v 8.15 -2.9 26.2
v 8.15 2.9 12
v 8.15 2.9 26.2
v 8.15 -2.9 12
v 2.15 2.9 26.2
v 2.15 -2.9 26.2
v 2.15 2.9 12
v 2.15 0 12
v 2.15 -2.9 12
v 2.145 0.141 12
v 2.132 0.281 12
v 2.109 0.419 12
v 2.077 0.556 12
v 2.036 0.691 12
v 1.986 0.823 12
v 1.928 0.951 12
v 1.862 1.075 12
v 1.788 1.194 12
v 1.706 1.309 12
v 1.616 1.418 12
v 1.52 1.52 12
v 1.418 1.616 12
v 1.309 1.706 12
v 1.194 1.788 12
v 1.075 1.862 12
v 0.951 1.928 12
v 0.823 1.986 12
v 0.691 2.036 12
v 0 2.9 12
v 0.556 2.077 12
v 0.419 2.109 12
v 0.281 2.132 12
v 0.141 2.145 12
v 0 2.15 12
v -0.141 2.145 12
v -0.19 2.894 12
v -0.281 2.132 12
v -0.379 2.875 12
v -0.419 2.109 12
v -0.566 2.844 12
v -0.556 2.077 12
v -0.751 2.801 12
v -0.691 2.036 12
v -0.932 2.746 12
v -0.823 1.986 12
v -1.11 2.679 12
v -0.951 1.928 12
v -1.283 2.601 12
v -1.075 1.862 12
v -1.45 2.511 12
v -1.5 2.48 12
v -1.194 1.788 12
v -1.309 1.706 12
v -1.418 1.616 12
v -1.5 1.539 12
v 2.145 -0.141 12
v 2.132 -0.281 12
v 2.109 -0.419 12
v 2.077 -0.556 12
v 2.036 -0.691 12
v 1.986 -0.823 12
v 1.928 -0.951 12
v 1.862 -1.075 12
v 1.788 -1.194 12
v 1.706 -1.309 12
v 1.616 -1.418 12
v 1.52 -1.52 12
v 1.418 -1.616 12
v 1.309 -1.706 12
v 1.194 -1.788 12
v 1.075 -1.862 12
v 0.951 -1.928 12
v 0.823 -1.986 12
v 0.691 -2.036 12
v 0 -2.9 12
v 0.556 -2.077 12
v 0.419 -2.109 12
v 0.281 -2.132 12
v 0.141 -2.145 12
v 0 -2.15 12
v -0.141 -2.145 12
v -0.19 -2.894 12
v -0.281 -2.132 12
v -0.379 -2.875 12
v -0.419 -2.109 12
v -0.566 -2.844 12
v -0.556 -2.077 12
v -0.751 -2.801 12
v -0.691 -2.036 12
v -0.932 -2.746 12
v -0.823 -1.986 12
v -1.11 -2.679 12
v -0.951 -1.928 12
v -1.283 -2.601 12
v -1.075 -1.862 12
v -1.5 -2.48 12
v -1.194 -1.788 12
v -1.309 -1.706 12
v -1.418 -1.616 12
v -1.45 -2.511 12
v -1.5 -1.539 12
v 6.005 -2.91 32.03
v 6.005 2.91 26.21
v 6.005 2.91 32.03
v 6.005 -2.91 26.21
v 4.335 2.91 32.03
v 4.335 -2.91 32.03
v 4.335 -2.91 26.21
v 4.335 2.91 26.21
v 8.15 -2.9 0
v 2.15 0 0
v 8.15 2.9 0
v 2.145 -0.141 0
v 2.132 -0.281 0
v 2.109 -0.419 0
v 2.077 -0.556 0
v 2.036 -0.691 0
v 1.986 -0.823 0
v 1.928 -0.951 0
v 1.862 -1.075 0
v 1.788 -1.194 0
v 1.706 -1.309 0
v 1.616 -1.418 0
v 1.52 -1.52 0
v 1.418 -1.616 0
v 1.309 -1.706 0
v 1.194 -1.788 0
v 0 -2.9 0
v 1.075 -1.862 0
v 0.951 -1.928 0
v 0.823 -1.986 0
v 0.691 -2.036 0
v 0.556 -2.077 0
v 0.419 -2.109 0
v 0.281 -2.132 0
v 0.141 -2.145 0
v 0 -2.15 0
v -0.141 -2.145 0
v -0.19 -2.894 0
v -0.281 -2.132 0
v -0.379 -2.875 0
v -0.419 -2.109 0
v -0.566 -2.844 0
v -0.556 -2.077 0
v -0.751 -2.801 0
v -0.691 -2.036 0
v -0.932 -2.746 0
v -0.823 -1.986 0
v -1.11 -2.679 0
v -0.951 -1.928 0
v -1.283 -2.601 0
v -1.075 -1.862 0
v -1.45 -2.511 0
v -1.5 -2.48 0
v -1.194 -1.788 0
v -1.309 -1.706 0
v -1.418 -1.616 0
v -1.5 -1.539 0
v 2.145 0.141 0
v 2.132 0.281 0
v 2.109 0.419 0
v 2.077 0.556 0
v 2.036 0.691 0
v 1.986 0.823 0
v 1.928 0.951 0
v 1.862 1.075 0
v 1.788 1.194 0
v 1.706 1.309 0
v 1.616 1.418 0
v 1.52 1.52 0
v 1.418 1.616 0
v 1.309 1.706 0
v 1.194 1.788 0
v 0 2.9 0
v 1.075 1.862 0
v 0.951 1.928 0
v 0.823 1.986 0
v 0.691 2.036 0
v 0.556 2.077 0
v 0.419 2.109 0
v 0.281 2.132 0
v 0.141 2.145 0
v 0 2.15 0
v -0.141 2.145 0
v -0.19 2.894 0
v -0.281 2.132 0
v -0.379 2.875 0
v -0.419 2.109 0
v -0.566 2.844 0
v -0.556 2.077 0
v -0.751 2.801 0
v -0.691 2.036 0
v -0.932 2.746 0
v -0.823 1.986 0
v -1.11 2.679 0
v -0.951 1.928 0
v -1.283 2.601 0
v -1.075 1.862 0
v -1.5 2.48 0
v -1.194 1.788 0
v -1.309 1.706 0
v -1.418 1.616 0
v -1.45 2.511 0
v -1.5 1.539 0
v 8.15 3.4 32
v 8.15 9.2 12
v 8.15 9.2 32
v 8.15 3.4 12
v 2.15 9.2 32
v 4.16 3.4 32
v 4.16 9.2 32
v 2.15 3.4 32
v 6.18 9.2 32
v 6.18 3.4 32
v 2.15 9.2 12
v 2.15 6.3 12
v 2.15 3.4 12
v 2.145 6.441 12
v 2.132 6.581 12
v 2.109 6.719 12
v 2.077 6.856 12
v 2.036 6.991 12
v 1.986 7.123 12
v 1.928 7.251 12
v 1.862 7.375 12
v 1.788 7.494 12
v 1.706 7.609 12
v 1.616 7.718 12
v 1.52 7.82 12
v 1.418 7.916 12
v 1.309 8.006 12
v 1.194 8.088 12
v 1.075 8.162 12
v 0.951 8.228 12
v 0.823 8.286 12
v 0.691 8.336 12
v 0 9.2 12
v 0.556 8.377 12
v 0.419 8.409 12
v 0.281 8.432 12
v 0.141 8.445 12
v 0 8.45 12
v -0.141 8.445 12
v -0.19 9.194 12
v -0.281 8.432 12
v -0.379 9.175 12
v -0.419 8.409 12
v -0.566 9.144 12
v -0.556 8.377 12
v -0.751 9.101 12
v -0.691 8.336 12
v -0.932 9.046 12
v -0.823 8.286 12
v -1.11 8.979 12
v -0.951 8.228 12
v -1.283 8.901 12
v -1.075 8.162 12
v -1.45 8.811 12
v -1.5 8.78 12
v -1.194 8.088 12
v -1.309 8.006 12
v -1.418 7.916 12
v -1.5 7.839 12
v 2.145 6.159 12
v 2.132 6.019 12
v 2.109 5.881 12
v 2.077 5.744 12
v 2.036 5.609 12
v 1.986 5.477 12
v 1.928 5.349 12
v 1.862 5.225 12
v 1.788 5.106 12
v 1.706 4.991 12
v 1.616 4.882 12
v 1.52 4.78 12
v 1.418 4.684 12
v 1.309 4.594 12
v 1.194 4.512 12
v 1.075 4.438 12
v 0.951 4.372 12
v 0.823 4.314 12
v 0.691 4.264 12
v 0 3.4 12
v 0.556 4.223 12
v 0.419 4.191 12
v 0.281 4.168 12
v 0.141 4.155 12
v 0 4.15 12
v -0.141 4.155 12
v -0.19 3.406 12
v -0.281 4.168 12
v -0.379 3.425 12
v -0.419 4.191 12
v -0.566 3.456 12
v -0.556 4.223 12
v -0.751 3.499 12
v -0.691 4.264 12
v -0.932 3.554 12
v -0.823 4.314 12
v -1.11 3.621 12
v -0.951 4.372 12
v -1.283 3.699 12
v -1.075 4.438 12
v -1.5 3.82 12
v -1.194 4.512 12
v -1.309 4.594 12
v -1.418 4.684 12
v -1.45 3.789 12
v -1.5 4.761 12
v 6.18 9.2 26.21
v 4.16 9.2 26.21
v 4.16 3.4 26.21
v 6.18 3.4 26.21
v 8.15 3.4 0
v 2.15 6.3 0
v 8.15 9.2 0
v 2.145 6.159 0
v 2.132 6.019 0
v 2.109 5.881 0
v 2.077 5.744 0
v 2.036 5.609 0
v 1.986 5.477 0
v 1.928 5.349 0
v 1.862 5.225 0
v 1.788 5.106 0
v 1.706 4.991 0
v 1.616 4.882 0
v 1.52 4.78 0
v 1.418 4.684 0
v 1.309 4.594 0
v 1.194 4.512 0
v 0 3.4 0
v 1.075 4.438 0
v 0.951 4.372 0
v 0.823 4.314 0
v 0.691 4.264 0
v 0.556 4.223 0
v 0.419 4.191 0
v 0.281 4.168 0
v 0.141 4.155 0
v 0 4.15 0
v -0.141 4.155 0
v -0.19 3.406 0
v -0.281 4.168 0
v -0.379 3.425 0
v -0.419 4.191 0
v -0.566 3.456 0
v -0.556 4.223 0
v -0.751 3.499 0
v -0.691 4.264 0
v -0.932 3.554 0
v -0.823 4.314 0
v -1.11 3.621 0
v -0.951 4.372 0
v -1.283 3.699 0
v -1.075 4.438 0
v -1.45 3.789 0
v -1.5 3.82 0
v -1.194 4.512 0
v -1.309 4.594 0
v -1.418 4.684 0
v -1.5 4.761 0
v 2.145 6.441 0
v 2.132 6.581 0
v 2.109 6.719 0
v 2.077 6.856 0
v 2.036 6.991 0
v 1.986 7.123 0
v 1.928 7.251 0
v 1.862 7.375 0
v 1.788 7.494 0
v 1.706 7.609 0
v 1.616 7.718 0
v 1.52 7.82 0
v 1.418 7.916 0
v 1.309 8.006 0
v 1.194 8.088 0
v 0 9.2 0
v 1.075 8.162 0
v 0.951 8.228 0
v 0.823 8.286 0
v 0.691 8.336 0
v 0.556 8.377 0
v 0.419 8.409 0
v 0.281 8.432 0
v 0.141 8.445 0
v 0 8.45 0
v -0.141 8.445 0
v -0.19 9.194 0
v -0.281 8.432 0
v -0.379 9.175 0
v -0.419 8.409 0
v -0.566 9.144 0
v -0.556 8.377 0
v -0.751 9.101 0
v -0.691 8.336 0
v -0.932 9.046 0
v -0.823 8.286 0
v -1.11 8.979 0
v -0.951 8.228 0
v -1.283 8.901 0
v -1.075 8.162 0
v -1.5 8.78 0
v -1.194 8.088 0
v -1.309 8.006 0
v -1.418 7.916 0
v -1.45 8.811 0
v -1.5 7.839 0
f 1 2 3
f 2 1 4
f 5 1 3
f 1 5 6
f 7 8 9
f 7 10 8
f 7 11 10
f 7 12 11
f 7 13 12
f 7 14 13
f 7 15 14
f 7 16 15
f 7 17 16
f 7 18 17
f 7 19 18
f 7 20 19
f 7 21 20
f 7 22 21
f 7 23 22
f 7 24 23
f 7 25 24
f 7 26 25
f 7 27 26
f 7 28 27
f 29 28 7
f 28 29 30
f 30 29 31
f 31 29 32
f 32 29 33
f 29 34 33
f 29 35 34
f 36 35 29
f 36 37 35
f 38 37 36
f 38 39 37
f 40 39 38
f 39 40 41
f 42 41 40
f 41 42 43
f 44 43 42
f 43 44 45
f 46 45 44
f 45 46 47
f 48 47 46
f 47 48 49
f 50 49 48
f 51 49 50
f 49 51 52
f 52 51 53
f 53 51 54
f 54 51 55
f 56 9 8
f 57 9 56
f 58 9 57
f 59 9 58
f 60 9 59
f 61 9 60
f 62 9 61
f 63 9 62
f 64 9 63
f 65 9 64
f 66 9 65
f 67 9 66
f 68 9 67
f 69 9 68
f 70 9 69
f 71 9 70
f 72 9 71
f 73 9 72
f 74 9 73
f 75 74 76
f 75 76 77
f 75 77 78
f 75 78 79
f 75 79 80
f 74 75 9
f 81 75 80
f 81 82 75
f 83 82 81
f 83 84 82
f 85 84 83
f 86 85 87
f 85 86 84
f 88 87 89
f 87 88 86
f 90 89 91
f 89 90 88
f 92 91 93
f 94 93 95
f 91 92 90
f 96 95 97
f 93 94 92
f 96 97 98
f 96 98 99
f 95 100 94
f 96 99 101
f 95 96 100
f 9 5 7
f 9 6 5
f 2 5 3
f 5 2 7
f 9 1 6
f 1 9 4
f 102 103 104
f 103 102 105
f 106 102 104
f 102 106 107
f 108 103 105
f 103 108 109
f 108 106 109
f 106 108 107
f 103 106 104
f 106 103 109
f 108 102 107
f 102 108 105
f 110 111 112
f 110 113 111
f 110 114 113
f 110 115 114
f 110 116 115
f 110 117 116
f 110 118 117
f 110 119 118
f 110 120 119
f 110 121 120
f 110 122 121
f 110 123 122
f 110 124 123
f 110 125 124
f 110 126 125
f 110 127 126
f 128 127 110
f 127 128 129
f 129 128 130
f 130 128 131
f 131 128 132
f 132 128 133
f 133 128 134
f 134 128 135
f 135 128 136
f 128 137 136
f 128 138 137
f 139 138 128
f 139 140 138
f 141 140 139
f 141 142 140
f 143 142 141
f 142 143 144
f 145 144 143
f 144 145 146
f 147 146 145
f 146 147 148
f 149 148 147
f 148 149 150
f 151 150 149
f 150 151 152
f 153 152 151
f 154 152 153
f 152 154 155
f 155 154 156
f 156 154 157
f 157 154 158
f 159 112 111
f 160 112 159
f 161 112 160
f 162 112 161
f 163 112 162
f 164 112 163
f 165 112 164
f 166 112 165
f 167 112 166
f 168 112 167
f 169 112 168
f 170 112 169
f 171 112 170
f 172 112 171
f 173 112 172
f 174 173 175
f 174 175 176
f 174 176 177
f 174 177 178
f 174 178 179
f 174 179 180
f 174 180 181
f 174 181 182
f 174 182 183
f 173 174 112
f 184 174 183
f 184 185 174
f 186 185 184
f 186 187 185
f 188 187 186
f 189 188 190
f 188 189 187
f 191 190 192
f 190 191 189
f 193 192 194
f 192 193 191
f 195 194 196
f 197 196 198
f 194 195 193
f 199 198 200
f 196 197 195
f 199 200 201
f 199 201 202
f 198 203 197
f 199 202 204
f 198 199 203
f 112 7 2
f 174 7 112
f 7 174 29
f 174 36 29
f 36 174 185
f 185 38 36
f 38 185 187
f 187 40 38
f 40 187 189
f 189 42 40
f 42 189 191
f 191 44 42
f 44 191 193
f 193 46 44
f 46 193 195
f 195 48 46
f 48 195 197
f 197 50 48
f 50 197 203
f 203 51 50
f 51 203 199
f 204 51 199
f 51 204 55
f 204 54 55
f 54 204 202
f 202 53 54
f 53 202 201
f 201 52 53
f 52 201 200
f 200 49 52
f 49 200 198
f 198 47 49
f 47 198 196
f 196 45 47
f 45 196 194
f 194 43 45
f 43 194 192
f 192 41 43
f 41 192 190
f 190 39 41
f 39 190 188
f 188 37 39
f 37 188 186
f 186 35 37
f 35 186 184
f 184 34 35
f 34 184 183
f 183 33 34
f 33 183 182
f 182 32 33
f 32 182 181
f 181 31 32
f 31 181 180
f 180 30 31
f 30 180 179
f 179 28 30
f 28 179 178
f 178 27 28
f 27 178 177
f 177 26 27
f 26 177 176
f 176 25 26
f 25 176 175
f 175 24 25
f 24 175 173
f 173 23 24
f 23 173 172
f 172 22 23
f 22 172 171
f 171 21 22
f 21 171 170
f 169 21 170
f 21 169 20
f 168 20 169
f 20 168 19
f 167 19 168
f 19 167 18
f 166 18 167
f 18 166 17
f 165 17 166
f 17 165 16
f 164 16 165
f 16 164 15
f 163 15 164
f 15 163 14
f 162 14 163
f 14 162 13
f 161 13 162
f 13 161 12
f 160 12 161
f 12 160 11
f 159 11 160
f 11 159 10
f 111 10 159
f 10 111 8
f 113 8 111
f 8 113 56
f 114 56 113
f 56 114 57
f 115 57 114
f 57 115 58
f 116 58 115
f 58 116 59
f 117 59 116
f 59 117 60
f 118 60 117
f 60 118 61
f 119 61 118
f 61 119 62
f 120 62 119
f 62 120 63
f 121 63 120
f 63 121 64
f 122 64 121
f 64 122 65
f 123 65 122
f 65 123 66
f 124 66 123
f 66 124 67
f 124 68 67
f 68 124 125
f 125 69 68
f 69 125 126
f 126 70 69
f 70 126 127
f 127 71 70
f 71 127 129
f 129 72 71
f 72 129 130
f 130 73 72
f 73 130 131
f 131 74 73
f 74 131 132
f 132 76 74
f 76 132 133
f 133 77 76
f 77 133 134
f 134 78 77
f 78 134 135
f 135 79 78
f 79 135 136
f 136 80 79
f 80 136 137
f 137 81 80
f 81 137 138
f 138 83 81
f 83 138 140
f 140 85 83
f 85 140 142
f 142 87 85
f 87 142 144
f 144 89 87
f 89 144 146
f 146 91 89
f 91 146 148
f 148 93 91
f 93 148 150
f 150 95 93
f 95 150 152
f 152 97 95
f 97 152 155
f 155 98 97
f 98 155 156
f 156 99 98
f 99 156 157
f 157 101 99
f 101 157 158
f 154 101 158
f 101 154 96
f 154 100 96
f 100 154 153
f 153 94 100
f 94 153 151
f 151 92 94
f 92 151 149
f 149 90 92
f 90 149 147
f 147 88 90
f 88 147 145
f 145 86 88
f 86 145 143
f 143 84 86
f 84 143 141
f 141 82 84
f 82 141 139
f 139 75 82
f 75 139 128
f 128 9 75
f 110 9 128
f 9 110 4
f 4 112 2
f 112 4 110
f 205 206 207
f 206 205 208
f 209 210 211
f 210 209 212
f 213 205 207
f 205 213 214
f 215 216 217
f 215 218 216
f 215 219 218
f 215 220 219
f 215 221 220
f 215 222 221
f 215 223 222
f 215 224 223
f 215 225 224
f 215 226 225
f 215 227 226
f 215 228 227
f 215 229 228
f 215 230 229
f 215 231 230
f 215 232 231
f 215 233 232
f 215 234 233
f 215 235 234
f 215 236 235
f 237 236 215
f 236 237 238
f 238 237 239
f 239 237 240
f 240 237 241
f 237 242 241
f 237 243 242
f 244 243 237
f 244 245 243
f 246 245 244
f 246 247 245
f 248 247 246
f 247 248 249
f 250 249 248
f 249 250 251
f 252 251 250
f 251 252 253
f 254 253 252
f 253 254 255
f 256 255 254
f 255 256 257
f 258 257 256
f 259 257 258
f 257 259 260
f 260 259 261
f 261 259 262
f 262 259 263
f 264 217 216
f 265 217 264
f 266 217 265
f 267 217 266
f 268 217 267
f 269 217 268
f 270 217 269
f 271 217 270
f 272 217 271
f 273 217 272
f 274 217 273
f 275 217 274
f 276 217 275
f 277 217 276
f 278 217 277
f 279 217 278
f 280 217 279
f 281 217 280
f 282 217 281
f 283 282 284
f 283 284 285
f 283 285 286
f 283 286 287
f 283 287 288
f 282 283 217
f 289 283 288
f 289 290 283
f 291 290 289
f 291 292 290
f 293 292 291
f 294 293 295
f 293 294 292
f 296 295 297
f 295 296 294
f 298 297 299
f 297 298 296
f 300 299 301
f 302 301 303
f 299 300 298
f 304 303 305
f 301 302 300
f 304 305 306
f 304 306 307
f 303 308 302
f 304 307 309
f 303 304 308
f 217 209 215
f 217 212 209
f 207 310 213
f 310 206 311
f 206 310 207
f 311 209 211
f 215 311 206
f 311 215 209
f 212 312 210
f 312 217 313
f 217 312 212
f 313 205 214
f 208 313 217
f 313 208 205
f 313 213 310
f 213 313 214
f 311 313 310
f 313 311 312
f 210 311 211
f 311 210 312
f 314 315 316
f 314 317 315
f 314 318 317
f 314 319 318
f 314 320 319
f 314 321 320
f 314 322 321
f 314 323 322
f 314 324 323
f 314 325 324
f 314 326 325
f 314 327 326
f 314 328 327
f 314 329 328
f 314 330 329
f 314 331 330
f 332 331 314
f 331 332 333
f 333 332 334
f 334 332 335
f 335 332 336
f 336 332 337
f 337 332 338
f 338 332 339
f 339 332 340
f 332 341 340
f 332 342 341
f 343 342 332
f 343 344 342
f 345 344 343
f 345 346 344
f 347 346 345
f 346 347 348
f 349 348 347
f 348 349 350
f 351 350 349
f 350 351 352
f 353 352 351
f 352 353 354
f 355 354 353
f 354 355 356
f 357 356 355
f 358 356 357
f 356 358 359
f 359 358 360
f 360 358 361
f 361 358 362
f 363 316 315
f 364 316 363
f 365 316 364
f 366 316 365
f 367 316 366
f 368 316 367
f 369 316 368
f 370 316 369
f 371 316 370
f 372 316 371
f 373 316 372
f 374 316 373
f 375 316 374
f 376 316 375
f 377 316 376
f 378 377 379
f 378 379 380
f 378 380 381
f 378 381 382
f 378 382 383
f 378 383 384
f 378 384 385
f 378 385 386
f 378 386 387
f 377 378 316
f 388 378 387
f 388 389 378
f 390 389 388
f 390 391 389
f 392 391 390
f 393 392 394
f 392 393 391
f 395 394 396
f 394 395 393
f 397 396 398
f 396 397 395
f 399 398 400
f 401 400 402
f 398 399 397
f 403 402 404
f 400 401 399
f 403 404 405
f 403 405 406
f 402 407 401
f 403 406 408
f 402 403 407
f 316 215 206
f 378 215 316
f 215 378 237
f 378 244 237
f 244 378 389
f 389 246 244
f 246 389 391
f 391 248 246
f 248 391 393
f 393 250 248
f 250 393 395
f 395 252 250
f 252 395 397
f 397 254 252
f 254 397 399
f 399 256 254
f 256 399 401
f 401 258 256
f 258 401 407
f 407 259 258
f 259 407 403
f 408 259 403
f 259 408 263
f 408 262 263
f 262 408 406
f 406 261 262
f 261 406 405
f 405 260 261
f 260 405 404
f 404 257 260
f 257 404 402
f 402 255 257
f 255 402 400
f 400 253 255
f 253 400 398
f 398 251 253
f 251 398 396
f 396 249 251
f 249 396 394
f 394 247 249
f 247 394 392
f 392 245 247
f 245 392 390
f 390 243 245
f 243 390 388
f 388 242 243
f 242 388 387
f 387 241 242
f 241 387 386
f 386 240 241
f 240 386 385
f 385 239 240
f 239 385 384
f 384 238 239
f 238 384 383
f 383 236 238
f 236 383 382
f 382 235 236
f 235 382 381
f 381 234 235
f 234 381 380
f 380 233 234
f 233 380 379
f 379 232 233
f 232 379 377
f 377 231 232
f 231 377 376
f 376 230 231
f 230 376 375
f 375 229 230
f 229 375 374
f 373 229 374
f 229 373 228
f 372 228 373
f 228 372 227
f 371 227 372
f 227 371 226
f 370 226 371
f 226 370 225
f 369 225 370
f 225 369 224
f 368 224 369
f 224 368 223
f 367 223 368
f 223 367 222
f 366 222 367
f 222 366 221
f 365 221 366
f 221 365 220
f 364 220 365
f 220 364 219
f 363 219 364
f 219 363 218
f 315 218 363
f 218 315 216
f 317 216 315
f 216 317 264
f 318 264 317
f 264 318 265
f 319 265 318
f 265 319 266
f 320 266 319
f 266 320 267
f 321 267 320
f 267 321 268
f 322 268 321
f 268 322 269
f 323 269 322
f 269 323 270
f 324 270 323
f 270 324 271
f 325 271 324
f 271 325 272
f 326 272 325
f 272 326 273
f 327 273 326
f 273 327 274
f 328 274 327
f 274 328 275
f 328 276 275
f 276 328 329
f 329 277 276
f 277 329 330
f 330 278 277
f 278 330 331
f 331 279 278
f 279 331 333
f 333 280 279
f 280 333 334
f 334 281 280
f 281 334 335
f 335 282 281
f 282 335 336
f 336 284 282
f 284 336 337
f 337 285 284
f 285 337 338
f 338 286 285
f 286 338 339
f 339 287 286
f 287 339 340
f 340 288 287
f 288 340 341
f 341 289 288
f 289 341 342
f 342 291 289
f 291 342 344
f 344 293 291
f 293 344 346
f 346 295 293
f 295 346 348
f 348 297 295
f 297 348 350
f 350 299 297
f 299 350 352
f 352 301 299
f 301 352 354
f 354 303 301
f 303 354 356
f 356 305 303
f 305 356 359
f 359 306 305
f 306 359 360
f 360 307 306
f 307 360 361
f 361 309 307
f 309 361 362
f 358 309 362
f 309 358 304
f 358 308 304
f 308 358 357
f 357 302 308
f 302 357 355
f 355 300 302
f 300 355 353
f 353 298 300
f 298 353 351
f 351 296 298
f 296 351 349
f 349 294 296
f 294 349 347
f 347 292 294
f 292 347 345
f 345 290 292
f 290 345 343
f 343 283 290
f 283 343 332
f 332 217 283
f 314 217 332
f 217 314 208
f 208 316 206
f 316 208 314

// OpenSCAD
grill_diameter=4.3;
clip_height=12;
wall_thickness=1.5;
foot_thickness=6;
epsilon=0.01;
inner_diameter=grill_diameter;
outer_diameter=inner_diameter + wall_thickness;
overhang_distance=1.5;
arm_length=20;
tolerance=0.35;

$fn=96;

module outline () {
  difference() {
    union() {
      circle(d=outer_diameter);
      translate([0,-outer_diameter/2,0]) {
        square(size=[inner_diameter/2+foot_thickness, outer_diameter]);
      }
    }
    circle(d=inner_diameter);
    translate([-outer_diameter-overhang_distance,-outer_diameter/2,0]) {
      square(size=[outer_diameter,outer_diameter]);
    }
  }
}

module foot () {
  linear_extrude(height=clip_height) {
    outline();
  }
}

module clip () {
  union() {
    foot();
    translate([outer_diameter+wall_thickness/2,0,0]) {
      rotate([0,0,180]) {
        foot();
      }
    }
  }
}

module connector_f () {
  union() {
    foot();
    difference() {
      translate([inner_diameter/2, -outer_diameter/2, clip_height]) {
        cube([foot_thickness, outer_diameter, arm_length]);
      }
      translate([inner_diameter/2+foot_thickness*1/3+epsilon, -outer_diameter/2-epsilon, clip_height+arm_length-outer_diameter+epsilon]) {
        cube([foot_thickness/3+2*epsilon, outer_diameter+2*epsilon, outer_diameter+2*epsilon]);
      }
    }
  }
}

module connector_m () {
  union() {
    foot();
    union() {
      translate([inner_diameter/2, -outer_diameter/2, clip_height]) {
        cube([foot_thickness, outer_diameter, arm_length-outer_diameter]);
      }
      translate([inner_diameter/2+foot_thickness*1/3+tolerance/2+epsilon, -outer_diameter/2-epsilon, clip_height+arm_length-outer_diameter+epsilon]) {
        cube([foot_thickness/3+2*epsilon-tolerance, outer_diameter+2*epsilon, outer_diameter+2*epsilon]);
      }
    }
  }
}


/* union () { */
/*   translate([outer_diameter+0.4, 0, 0])  */
/*     clip(); */
/*   foot(); */
/* } */

union () {
  connector_m();
  translate([0, outer_diameter+0.5, 0]) {
    connector_f();
  }
}
